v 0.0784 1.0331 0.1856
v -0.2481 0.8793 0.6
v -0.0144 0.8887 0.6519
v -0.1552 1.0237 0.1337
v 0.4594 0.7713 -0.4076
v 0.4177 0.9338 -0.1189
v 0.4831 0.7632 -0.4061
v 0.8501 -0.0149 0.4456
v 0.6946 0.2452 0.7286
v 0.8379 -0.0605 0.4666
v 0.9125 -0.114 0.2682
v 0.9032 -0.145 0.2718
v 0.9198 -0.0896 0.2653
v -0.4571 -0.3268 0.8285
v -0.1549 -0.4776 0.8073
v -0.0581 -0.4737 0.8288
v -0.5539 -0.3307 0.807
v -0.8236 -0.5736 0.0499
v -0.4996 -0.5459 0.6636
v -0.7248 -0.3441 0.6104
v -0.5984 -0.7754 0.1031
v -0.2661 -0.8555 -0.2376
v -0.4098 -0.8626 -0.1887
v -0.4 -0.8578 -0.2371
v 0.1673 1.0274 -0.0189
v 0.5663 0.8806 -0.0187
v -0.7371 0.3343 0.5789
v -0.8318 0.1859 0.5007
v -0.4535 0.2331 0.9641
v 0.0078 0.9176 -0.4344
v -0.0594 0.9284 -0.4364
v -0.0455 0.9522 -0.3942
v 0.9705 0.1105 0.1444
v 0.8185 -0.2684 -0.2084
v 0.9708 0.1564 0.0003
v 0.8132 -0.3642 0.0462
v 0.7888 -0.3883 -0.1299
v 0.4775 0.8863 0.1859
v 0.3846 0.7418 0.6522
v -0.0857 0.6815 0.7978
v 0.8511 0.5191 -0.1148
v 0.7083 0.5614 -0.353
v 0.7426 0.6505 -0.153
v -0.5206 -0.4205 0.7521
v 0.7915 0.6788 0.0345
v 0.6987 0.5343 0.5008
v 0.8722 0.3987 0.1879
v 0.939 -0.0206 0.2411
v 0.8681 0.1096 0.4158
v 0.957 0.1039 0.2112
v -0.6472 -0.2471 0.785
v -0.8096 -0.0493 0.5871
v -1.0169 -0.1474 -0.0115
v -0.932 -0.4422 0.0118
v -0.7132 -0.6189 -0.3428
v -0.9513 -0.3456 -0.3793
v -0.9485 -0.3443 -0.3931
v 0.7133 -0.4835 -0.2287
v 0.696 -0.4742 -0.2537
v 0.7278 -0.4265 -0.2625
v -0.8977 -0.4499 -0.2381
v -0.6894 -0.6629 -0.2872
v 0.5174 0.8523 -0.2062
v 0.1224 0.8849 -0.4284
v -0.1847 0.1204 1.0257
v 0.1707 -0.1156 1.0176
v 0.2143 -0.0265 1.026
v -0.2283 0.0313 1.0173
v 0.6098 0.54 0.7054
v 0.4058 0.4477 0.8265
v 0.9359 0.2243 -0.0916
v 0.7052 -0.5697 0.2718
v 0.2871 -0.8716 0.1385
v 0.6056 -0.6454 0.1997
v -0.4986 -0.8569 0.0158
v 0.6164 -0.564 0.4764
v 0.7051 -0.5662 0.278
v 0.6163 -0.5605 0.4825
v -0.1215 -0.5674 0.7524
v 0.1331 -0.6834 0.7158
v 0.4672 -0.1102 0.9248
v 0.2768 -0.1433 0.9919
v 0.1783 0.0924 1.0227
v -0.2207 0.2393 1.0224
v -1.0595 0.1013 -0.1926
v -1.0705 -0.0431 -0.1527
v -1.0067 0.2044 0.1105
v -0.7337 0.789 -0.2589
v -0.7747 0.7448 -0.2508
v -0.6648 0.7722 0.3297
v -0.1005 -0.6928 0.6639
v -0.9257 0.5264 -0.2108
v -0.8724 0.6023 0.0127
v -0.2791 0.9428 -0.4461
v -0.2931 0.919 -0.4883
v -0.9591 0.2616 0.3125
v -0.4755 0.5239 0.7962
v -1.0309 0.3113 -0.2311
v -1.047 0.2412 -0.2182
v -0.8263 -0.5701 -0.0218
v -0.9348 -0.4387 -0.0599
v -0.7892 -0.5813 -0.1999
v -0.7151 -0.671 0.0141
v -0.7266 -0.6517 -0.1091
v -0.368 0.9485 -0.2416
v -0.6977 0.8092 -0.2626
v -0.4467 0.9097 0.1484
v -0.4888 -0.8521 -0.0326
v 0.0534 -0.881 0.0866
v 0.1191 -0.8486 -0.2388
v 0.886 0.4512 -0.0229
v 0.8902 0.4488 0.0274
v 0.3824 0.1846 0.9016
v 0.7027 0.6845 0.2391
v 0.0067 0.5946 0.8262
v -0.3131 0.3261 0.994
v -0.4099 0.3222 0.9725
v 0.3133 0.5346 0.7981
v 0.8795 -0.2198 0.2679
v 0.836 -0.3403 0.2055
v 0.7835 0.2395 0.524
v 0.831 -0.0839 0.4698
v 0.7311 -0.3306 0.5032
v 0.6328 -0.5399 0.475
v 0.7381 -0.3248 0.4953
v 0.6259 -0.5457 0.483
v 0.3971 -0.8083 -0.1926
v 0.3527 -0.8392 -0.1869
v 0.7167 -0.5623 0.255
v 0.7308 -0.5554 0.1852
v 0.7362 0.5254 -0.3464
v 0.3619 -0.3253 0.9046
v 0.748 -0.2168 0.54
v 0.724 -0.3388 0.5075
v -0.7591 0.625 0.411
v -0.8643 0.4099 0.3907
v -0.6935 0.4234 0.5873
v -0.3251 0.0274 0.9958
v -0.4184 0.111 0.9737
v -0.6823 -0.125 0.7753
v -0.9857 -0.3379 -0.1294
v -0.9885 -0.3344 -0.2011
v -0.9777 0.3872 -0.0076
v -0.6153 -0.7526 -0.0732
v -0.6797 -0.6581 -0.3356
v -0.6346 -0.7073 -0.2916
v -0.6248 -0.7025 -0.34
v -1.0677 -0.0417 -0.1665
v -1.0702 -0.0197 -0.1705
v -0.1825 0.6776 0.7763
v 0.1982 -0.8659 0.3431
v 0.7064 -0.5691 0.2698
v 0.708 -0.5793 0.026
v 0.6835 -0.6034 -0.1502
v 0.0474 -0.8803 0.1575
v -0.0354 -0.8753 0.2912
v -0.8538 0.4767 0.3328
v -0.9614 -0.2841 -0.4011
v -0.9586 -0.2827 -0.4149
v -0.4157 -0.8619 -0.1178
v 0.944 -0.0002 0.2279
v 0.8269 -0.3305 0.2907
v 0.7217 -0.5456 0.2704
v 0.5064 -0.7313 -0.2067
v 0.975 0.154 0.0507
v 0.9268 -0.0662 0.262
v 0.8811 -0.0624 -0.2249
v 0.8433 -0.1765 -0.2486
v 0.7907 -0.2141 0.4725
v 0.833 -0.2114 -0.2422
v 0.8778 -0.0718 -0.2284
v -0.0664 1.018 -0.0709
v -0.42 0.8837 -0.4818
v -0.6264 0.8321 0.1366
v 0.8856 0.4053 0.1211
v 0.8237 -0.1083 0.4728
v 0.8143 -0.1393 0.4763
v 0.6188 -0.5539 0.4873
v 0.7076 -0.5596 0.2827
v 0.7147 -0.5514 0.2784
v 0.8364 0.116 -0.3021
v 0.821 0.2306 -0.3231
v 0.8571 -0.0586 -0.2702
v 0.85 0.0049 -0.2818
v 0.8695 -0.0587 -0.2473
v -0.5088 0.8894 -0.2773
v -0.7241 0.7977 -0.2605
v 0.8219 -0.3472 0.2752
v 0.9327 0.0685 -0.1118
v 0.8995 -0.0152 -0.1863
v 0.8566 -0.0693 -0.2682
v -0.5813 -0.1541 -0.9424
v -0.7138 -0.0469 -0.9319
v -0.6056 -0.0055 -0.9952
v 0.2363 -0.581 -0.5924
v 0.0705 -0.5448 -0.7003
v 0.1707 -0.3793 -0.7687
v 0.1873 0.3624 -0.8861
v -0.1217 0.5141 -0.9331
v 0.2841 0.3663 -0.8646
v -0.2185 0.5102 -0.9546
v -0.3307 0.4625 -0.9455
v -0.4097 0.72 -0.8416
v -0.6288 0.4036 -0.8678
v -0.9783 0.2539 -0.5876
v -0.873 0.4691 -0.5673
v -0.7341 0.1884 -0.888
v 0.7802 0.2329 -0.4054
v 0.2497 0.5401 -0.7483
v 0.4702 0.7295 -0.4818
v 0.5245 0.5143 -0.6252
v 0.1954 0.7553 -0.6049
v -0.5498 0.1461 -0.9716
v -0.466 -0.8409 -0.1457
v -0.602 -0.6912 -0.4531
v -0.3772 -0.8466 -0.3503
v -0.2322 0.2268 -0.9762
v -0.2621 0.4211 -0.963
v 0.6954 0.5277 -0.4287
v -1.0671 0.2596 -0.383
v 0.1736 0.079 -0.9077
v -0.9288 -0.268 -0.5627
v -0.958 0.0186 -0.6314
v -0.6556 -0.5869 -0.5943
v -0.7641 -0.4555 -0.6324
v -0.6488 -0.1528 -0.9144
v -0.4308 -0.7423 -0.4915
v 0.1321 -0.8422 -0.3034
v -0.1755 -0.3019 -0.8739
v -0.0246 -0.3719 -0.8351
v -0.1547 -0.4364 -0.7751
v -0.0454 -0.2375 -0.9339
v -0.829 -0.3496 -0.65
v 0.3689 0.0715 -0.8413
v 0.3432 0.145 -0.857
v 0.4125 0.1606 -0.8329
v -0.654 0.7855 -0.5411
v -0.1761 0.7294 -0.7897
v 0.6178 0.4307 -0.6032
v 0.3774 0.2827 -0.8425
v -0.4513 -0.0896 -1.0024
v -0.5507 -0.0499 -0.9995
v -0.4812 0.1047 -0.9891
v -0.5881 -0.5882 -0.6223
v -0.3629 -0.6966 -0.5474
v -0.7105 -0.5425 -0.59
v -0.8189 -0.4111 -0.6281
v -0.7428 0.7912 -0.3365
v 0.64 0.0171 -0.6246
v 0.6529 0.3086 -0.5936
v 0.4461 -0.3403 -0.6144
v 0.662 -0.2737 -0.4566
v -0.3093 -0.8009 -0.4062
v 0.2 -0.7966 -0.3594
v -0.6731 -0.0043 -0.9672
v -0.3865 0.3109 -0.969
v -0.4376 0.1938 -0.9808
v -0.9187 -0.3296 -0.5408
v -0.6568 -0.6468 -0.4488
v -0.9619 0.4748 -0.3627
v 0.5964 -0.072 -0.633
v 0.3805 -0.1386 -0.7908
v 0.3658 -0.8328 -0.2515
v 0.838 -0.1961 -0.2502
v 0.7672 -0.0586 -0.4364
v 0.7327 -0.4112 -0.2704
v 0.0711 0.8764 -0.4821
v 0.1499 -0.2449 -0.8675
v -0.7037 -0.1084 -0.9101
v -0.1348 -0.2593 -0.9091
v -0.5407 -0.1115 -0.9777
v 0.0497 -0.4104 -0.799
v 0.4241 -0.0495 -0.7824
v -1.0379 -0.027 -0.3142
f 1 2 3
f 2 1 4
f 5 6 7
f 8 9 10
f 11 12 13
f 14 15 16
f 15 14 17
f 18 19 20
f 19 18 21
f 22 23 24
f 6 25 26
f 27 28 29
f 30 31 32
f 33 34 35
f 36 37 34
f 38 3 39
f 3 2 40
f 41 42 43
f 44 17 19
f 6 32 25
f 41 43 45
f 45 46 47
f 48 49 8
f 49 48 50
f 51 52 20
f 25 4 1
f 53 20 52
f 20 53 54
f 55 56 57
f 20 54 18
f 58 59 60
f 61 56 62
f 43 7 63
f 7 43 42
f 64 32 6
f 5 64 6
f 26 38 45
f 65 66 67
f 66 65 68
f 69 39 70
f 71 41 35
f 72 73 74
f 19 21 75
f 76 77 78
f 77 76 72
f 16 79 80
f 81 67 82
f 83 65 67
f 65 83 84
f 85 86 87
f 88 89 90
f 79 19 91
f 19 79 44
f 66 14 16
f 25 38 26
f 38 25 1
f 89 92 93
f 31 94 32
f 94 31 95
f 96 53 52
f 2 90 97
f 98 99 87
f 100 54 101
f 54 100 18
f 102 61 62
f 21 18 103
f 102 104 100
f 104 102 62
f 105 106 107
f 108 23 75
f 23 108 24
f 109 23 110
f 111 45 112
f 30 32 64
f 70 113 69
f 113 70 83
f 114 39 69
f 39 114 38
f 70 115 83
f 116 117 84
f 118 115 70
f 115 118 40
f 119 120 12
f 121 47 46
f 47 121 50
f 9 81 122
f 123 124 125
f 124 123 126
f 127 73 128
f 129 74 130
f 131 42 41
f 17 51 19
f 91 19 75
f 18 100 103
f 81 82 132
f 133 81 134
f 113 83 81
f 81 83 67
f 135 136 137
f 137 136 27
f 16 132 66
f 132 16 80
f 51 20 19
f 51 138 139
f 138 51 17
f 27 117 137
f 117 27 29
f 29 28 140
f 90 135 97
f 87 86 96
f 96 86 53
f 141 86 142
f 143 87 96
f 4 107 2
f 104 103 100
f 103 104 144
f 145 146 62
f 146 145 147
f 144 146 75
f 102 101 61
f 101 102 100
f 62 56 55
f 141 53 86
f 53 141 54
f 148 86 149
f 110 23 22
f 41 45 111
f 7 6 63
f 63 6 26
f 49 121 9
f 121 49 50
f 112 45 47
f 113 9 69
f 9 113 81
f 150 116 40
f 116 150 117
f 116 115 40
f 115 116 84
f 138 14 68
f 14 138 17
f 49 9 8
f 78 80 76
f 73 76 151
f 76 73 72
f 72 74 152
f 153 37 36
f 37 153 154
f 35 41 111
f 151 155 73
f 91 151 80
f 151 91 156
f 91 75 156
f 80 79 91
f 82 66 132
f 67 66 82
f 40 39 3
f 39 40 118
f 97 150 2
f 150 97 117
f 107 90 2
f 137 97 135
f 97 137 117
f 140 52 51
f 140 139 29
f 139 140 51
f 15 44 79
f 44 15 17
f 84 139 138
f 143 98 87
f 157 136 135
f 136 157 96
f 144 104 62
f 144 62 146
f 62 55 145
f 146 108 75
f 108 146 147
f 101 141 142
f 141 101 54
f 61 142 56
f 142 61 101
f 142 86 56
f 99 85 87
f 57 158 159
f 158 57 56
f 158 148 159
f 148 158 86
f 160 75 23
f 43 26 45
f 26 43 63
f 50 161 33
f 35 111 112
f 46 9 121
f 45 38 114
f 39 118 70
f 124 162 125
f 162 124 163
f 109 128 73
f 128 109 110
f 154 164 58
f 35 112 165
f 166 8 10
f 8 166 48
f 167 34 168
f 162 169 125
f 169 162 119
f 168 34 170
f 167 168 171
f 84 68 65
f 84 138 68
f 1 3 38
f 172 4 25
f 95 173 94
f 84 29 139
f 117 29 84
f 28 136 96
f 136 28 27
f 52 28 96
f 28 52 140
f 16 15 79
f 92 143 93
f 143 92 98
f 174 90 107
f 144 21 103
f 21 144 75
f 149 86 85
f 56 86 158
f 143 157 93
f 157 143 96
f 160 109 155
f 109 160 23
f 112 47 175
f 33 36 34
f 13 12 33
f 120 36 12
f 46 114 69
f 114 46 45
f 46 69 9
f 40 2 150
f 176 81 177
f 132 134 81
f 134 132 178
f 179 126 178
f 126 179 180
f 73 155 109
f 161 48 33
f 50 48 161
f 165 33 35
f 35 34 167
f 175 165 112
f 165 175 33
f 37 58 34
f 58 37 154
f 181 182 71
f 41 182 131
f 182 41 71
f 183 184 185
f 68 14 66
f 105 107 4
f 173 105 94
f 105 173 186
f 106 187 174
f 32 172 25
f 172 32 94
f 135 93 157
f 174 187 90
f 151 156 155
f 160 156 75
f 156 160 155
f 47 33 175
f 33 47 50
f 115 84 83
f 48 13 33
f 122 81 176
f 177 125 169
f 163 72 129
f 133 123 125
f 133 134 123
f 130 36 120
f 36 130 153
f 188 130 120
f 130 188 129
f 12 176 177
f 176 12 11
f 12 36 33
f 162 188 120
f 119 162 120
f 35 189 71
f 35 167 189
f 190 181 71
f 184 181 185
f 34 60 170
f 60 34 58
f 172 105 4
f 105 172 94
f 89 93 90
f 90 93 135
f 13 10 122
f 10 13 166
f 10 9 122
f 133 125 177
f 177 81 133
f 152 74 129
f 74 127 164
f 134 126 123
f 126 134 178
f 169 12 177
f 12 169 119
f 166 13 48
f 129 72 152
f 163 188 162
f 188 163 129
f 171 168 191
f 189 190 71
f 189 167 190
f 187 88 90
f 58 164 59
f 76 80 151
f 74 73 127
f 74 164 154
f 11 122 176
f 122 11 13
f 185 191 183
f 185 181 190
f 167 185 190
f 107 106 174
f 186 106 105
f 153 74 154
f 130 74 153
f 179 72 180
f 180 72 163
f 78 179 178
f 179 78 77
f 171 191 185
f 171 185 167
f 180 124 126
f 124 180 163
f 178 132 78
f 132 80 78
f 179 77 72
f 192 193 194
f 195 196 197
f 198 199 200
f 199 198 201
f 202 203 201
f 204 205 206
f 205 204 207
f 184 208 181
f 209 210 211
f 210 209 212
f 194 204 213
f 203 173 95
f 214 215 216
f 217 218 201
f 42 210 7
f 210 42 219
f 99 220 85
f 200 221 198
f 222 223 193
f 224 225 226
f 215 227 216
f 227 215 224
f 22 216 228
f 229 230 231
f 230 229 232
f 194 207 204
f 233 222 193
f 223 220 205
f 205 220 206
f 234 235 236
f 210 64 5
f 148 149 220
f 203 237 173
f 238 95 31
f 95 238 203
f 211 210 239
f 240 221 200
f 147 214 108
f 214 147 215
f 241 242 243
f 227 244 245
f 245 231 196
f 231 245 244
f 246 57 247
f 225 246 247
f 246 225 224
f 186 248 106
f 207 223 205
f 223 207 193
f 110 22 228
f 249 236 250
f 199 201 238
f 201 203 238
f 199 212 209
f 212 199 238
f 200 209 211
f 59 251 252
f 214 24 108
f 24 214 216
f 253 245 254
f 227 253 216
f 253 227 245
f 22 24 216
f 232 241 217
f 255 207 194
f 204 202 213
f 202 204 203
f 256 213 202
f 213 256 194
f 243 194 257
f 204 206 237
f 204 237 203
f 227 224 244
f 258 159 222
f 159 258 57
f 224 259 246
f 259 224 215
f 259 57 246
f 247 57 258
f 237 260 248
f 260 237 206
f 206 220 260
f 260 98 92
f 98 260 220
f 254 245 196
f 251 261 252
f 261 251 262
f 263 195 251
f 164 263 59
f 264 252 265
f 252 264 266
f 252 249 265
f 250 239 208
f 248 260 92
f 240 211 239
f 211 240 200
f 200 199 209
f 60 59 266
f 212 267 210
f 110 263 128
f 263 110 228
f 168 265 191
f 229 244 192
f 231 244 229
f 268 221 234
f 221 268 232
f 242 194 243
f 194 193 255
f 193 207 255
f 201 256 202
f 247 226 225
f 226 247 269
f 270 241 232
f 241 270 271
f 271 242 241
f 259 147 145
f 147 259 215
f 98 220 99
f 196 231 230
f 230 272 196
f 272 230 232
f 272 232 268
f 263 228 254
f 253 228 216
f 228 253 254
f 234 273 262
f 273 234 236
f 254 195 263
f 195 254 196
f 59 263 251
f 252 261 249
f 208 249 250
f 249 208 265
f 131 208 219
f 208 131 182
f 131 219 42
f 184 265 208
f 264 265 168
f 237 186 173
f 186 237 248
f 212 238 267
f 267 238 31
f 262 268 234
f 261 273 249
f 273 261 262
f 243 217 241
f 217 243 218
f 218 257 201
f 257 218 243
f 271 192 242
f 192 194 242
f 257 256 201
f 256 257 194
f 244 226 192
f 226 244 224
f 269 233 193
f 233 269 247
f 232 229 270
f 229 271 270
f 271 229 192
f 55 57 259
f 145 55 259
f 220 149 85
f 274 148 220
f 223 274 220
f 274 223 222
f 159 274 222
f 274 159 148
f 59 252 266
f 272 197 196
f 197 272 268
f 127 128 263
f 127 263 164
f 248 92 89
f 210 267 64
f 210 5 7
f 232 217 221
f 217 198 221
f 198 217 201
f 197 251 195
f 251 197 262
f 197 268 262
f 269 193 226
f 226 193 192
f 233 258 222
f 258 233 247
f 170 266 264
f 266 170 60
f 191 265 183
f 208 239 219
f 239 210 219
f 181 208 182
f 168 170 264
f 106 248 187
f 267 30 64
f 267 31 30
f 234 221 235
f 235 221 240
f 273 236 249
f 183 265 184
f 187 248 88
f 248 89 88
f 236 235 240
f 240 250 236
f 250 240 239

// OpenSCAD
color("gray") render()
    
    
minkowski(){    difference(){
 
    simple();
 
        
    for([0:1]){  
        rotate(rands(-360,360,3))
        translate(rands(-.1,.1,3))
        translate([2.125 ,0,0])scale(4)scale([.5,.75,1])
        
            minkowski(){
                simple();
                 scale(.1)simple();
            } 
    }

}
     scale(.51)simple();
}   

module simple()
{
    
    hull(){
    for([0:2]){    scale(rands(0.75,1.125,3))
        translate(rands(-.1,.1,3))
        rotate(rands(-360,360,3))
        scale(rands(0.75,1.25,3))sphere(.7,$fn=8);
    }
        }
    }
